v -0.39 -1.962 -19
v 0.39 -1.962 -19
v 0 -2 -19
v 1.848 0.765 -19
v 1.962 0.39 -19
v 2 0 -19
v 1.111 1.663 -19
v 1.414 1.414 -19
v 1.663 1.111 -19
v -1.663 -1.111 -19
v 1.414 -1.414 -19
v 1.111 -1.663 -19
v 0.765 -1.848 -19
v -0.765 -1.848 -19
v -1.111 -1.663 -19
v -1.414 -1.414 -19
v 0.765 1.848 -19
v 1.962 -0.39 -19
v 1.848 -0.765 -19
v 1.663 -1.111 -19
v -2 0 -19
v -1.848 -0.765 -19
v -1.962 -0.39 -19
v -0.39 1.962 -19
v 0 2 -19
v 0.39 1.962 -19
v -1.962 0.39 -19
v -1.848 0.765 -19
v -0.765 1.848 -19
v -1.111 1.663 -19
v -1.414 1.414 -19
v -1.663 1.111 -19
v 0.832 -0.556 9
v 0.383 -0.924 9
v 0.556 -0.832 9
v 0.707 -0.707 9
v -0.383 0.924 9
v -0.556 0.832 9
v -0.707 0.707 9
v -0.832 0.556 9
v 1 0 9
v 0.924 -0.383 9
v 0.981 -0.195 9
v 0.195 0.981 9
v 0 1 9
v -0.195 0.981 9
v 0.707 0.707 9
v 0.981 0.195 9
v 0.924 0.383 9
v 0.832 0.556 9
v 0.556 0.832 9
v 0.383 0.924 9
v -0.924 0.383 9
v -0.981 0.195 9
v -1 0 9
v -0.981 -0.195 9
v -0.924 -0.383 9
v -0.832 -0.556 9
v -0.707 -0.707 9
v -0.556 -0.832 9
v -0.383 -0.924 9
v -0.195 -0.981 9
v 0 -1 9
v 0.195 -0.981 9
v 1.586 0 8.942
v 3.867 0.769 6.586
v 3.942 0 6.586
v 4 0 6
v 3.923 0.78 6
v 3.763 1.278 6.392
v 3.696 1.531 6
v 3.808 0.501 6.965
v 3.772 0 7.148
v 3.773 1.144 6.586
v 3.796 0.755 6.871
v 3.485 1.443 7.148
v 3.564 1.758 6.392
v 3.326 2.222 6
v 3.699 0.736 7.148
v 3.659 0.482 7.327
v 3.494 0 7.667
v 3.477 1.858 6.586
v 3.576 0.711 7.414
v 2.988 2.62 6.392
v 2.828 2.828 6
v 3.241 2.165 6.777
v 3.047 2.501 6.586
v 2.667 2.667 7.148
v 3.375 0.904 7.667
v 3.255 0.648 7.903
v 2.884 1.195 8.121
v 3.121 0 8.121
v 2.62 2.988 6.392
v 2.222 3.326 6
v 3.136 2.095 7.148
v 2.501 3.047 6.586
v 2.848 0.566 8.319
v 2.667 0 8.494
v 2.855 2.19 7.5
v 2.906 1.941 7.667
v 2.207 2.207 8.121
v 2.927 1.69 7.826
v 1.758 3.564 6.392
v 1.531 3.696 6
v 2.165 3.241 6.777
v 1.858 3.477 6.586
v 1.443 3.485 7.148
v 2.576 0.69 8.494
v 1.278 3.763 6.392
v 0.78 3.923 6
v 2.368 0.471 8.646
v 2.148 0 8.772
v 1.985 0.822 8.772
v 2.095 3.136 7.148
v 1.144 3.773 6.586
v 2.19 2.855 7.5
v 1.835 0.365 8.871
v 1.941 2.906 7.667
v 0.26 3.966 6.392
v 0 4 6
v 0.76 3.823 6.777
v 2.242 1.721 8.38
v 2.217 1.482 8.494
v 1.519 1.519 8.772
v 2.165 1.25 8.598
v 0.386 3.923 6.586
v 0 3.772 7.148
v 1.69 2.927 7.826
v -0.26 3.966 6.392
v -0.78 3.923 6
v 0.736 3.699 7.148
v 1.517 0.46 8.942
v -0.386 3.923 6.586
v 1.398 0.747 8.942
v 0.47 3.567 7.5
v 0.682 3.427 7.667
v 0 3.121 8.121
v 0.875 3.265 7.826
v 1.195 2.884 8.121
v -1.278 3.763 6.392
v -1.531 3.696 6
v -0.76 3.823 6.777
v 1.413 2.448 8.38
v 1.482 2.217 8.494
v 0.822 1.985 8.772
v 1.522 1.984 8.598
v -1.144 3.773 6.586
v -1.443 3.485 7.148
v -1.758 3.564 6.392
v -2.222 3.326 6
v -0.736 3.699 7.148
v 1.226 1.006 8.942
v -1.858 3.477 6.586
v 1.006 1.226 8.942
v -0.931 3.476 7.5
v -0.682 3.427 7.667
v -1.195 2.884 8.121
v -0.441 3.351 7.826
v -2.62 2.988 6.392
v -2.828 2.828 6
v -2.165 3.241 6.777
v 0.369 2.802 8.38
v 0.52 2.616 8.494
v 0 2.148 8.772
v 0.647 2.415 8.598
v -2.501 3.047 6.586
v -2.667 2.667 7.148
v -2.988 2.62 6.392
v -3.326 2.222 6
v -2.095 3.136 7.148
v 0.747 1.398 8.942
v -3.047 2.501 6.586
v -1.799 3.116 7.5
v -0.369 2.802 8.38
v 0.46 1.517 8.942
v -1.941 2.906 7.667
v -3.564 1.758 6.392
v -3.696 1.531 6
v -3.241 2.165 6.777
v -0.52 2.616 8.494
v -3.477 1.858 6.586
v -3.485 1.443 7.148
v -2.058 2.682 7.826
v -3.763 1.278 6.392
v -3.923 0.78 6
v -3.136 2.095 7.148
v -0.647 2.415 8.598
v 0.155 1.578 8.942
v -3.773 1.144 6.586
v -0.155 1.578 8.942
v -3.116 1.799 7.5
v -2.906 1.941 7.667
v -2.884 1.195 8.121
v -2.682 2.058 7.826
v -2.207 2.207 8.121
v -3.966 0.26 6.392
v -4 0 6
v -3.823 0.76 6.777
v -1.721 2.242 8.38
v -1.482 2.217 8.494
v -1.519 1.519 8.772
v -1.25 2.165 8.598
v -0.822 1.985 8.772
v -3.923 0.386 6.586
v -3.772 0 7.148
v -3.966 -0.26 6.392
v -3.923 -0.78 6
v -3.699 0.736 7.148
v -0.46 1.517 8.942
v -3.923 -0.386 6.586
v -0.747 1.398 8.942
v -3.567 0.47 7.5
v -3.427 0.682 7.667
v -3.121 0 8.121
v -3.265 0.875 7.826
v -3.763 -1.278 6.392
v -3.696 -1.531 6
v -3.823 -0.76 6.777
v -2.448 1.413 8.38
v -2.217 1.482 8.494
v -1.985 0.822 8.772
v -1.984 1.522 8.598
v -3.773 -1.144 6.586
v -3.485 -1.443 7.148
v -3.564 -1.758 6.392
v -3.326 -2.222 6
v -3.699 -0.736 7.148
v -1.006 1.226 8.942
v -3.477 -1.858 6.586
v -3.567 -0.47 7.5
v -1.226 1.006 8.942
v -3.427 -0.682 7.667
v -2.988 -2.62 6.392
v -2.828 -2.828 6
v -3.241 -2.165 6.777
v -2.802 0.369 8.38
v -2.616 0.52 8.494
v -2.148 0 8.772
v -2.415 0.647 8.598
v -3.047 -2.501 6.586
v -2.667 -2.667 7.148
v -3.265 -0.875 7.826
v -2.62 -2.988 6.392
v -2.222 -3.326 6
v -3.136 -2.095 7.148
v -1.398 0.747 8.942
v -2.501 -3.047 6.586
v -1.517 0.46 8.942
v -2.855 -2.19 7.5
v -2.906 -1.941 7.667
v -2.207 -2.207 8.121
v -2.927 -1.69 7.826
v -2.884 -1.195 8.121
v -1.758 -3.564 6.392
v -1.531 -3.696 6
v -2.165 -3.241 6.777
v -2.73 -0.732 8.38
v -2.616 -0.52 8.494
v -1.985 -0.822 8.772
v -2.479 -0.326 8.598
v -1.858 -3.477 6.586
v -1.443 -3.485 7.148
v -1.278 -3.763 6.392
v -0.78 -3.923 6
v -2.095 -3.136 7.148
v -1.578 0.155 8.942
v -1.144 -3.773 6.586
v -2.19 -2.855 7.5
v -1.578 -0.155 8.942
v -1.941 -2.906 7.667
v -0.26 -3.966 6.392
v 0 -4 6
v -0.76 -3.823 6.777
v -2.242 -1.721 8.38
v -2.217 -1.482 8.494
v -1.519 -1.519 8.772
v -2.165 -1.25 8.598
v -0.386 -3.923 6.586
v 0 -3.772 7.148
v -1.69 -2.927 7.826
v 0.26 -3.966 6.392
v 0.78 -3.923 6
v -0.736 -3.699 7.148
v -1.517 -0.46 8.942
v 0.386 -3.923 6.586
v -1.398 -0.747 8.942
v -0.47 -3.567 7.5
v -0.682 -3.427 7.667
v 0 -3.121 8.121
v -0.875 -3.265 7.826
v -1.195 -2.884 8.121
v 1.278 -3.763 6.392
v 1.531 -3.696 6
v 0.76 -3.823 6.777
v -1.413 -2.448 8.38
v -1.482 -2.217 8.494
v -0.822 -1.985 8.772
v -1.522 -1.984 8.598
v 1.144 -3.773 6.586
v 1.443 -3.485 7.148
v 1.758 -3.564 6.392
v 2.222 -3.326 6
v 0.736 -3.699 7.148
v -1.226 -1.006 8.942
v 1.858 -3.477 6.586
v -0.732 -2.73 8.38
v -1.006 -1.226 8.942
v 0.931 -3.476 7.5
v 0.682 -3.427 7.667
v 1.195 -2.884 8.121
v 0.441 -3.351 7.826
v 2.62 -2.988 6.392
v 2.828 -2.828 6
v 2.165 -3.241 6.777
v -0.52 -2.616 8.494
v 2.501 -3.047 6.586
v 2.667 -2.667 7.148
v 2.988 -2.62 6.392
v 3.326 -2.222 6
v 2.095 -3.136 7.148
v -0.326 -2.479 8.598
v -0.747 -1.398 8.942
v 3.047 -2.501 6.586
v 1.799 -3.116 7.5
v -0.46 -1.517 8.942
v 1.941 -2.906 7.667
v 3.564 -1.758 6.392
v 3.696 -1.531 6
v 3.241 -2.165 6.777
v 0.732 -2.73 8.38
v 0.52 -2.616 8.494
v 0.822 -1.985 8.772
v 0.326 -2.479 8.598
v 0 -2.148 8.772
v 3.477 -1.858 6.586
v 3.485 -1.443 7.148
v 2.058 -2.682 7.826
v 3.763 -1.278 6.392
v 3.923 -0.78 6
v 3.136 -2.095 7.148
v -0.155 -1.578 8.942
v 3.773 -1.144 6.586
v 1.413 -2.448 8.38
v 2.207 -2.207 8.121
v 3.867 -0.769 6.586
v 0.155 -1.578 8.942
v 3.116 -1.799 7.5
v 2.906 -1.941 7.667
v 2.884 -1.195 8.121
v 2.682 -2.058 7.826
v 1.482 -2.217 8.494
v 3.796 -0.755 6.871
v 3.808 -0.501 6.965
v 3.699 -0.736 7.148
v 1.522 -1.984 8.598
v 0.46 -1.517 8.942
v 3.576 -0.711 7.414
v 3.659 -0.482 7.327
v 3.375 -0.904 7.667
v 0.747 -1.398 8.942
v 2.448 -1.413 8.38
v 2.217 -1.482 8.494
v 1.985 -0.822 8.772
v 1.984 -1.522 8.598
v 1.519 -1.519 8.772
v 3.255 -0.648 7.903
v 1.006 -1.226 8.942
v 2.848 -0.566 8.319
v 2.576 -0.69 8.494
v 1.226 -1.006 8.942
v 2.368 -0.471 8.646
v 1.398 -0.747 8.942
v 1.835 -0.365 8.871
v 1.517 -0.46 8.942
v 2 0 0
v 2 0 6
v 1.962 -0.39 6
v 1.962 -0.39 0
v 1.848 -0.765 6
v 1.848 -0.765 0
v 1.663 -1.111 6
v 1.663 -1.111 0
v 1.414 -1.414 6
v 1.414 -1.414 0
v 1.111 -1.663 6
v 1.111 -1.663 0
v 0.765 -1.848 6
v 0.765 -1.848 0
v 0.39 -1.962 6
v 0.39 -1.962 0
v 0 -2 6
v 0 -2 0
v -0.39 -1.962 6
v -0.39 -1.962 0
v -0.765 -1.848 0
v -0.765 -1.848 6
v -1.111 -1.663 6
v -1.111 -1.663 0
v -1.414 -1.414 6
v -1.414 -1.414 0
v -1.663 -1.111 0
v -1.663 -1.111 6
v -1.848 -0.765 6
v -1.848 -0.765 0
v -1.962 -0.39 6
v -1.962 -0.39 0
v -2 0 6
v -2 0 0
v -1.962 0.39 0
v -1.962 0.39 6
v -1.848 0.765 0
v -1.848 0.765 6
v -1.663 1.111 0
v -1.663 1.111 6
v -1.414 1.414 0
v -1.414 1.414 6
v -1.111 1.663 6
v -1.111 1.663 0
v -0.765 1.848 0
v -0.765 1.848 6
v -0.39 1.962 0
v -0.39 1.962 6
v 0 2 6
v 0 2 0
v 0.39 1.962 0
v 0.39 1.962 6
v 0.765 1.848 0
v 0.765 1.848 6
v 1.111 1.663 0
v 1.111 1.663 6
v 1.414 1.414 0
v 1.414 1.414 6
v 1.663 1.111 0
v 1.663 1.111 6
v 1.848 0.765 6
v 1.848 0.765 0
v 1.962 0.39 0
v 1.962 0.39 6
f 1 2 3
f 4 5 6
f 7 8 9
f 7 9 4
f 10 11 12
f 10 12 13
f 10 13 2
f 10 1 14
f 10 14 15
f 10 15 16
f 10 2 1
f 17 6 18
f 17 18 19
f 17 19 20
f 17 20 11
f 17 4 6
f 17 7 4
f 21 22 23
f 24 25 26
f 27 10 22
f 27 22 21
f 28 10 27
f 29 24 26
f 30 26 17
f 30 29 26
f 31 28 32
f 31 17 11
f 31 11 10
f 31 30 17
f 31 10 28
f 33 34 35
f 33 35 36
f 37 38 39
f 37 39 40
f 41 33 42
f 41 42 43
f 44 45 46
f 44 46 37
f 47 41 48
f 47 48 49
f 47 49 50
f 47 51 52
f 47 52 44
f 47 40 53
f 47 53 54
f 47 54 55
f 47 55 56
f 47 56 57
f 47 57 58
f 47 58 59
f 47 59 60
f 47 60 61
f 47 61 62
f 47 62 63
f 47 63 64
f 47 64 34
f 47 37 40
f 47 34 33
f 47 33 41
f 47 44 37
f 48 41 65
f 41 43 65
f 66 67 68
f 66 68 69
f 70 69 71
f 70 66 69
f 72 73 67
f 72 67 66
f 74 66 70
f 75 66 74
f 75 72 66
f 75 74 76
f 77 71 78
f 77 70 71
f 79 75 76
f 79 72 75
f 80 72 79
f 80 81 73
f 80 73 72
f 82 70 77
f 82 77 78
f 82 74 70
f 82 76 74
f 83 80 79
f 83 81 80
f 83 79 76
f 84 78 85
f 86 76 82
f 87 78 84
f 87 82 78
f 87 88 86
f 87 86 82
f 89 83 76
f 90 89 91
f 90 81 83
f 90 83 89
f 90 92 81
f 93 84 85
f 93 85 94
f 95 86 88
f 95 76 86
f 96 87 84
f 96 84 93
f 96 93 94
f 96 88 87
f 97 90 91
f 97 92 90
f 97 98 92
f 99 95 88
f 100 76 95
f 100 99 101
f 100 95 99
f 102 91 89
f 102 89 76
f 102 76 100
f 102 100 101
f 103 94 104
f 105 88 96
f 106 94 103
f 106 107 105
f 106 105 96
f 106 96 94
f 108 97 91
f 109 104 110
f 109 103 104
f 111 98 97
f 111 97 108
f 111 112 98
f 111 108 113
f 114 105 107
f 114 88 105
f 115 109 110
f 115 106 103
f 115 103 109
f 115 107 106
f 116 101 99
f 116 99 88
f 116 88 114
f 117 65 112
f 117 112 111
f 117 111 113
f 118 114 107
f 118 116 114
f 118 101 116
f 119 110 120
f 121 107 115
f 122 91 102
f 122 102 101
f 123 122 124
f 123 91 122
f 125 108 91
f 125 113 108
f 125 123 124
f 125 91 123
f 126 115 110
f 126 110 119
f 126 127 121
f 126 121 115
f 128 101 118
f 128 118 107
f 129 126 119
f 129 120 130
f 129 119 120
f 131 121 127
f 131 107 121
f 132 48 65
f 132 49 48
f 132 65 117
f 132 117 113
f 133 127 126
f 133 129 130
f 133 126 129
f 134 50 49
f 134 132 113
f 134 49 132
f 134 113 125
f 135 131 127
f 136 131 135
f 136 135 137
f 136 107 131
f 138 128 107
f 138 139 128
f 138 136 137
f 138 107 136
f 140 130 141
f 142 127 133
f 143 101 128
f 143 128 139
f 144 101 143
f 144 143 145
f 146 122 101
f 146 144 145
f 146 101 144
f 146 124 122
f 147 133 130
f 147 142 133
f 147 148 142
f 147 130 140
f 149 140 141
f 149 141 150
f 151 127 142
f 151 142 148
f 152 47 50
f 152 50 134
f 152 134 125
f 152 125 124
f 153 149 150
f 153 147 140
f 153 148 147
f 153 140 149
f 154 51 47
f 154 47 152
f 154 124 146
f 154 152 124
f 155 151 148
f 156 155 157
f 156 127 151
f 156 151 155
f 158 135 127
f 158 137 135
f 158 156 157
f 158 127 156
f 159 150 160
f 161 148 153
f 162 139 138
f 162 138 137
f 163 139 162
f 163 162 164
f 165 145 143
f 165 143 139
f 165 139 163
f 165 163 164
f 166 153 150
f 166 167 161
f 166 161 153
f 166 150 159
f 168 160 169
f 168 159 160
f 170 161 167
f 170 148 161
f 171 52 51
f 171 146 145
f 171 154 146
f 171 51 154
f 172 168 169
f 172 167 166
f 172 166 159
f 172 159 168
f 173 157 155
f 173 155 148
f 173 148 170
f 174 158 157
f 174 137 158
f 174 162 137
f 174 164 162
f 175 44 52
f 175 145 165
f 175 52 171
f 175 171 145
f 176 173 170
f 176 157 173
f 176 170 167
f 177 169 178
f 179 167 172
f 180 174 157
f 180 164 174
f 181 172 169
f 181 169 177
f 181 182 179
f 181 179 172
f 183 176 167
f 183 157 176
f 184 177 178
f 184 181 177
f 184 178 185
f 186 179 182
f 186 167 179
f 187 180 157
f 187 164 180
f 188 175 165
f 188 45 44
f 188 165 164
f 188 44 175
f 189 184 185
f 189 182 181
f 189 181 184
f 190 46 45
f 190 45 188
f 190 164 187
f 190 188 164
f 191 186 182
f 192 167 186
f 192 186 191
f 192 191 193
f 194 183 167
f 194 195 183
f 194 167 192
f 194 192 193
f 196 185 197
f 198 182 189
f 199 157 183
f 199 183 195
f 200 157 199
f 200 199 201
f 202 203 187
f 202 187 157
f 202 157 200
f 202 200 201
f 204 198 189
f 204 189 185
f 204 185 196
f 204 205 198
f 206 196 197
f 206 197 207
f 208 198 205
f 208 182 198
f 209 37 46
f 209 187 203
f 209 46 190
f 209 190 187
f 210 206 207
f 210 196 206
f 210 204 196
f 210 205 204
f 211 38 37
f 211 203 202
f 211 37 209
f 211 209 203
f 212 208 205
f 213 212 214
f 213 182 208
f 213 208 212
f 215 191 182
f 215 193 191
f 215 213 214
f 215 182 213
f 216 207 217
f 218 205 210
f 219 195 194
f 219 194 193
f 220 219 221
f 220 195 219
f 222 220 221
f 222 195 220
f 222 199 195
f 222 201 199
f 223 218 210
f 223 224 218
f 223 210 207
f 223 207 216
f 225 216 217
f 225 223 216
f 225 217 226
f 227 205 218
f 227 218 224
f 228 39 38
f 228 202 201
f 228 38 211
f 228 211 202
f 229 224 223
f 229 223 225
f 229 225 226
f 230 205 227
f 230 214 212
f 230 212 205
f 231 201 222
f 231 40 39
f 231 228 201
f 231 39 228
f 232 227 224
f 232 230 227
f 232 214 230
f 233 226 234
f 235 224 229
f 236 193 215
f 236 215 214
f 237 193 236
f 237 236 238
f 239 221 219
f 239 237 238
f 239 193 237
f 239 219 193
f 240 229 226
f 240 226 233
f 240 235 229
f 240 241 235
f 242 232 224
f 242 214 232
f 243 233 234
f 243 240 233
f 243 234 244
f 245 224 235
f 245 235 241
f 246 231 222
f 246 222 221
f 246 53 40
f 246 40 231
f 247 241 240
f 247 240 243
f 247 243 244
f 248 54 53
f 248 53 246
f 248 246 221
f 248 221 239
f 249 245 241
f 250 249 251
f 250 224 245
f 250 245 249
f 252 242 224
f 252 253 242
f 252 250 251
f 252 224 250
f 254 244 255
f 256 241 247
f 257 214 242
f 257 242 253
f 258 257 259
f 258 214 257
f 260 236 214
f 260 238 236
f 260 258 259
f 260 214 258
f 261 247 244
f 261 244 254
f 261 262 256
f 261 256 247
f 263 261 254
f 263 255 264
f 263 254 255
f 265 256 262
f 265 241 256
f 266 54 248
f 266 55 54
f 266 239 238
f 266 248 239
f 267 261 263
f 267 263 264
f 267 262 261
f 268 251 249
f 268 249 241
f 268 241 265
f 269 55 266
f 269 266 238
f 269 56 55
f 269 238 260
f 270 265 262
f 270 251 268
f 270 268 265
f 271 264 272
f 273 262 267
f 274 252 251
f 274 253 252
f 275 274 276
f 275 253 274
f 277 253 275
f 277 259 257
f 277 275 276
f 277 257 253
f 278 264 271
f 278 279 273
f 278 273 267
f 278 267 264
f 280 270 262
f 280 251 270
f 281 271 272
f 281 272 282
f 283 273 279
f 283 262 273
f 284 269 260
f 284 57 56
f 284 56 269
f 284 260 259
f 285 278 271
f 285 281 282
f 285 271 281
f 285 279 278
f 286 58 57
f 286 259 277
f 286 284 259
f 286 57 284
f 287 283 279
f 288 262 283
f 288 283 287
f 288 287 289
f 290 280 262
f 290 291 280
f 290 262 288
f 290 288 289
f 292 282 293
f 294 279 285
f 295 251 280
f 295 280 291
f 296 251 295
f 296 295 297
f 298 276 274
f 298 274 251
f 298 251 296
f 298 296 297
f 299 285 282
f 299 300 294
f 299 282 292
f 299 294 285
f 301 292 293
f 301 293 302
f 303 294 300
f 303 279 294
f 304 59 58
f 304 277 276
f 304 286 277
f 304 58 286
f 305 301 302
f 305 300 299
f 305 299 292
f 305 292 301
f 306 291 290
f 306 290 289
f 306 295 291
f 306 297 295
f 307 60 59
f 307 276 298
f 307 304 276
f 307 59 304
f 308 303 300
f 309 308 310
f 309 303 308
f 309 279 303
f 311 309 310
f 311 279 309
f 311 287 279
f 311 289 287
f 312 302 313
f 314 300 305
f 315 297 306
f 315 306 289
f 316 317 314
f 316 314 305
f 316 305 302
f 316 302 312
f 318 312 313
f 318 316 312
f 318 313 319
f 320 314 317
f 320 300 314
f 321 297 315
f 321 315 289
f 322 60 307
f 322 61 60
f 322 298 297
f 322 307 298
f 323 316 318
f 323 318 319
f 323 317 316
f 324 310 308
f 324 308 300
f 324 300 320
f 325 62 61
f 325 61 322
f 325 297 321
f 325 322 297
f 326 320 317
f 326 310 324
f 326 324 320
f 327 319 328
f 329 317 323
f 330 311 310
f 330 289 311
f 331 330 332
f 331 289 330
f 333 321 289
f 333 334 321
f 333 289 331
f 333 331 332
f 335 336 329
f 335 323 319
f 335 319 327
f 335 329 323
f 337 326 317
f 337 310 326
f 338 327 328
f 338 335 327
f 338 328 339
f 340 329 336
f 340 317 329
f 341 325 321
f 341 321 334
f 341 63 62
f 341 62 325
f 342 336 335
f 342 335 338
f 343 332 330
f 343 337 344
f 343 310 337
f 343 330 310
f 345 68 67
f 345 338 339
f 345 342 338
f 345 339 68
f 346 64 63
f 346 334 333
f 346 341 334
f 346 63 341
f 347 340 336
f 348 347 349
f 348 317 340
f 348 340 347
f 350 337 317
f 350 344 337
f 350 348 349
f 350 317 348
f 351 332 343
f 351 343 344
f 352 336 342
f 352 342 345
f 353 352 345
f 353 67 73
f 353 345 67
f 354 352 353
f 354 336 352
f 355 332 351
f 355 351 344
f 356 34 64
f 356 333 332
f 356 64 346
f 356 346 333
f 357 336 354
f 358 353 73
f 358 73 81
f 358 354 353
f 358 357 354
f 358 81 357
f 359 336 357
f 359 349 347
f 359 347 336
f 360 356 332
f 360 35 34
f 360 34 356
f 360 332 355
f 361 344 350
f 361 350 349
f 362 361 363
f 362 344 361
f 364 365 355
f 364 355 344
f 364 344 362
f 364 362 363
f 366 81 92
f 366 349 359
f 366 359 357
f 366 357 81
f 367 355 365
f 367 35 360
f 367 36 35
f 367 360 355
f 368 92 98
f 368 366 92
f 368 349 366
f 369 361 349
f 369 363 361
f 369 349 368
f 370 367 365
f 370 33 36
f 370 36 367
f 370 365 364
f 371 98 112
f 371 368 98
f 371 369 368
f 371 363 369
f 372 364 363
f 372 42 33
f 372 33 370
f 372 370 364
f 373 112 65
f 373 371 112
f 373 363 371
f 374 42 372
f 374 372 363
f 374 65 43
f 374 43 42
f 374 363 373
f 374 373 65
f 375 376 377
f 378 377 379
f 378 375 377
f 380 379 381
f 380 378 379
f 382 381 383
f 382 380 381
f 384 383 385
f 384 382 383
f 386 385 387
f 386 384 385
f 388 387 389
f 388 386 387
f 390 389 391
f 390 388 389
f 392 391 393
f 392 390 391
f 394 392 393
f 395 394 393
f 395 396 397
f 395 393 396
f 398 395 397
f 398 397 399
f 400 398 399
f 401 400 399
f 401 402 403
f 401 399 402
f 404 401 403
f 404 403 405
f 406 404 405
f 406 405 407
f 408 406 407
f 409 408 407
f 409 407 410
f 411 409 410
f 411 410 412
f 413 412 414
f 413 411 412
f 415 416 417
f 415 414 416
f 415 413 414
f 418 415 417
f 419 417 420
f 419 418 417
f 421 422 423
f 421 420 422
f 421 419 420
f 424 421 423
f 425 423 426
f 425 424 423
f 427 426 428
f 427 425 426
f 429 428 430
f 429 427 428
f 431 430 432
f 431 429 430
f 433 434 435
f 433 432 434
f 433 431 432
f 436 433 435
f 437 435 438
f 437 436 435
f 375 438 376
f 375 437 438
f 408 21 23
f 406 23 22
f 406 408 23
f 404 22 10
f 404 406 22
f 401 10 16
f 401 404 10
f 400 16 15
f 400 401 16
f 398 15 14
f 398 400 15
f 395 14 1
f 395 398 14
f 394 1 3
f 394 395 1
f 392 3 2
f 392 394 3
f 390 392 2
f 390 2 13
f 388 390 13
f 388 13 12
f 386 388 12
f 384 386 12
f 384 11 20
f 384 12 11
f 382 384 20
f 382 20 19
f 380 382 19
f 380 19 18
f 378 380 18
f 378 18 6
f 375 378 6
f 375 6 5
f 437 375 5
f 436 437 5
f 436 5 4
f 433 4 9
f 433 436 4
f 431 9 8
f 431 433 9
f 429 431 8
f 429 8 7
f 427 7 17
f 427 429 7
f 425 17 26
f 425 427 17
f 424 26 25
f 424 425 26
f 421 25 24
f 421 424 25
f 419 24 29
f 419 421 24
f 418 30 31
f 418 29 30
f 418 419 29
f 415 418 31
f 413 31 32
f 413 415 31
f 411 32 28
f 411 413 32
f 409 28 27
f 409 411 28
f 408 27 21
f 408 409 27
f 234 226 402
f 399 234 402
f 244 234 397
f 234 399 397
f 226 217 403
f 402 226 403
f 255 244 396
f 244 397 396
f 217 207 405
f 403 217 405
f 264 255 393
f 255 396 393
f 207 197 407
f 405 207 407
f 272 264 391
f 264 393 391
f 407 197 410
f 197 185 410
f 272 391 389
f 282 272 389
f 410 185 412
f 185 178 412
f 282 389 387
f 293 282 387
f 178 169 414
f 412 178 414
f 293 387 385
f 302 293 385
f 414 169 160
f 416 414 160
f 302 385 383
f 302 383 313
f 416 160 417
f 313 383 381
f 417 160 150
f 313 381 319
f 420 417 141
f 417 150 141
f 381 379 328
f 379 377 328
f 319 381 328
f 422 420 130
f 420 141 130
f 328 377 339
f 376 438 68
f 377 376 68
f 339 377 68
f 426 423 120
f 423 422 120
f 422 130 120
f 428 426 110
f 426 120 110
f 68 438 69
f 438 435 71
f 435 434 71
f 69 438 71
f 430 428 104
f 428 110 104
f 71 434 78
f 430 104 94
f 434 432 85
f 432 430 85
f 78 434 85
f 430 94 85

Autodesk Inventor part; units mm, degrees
ref_plane "YZ Plane" through (0, 0, 0) normal (1, 0, 0) x (0, 1, 0)
ref_plane "XZ Plane" through (0, 0, 0) normal (0, 1, 0) x (-1, 0, 0)
ref_plane "XY Plane" through (0, 0, 0) normal (0, 0, 1) x (1, 0, 0)
sketch "スケッチ1" plane through (0, 0, 0) normal (0, 0, 1) x (1, 0, 0)
  circle A0 centre (0, 0) radius 2
  dimension "d0" = 4
extrude "押し出し1" add sketch "スケッチ1" along normal blind 6
sketch "スケッチ2" plane through (0, 0, 6) normal (0, 0, 1) x (1, 0, 0)
  circle A0 centre (0, 0) radius 2 projected
  circle A1 centre (0, 0) radius 4
  dimension "d3" = 8
extrude "押し出し2" add sketch "スケッチ2" along normal blind 3 contours A0 | A1
fillet "フィレット1" radius 3 1 edges at (-4, 0, 9)
thread "ねじ1" size "M4x0.7" class "6g" standard "ANSI Metric M Profile" full length
sketch "スケッチ3" plane through (0, 0, 0) normal (0, 0, -1) x (-1, 0, 0)
  circle A0 centre (0, 0) radius 2
extrude "押し出し3" add sketch "スケッチ3" along normal blind 19
properties part number "SB　M4 25mm なべネジ" material "Stainless Steel, 440C"
